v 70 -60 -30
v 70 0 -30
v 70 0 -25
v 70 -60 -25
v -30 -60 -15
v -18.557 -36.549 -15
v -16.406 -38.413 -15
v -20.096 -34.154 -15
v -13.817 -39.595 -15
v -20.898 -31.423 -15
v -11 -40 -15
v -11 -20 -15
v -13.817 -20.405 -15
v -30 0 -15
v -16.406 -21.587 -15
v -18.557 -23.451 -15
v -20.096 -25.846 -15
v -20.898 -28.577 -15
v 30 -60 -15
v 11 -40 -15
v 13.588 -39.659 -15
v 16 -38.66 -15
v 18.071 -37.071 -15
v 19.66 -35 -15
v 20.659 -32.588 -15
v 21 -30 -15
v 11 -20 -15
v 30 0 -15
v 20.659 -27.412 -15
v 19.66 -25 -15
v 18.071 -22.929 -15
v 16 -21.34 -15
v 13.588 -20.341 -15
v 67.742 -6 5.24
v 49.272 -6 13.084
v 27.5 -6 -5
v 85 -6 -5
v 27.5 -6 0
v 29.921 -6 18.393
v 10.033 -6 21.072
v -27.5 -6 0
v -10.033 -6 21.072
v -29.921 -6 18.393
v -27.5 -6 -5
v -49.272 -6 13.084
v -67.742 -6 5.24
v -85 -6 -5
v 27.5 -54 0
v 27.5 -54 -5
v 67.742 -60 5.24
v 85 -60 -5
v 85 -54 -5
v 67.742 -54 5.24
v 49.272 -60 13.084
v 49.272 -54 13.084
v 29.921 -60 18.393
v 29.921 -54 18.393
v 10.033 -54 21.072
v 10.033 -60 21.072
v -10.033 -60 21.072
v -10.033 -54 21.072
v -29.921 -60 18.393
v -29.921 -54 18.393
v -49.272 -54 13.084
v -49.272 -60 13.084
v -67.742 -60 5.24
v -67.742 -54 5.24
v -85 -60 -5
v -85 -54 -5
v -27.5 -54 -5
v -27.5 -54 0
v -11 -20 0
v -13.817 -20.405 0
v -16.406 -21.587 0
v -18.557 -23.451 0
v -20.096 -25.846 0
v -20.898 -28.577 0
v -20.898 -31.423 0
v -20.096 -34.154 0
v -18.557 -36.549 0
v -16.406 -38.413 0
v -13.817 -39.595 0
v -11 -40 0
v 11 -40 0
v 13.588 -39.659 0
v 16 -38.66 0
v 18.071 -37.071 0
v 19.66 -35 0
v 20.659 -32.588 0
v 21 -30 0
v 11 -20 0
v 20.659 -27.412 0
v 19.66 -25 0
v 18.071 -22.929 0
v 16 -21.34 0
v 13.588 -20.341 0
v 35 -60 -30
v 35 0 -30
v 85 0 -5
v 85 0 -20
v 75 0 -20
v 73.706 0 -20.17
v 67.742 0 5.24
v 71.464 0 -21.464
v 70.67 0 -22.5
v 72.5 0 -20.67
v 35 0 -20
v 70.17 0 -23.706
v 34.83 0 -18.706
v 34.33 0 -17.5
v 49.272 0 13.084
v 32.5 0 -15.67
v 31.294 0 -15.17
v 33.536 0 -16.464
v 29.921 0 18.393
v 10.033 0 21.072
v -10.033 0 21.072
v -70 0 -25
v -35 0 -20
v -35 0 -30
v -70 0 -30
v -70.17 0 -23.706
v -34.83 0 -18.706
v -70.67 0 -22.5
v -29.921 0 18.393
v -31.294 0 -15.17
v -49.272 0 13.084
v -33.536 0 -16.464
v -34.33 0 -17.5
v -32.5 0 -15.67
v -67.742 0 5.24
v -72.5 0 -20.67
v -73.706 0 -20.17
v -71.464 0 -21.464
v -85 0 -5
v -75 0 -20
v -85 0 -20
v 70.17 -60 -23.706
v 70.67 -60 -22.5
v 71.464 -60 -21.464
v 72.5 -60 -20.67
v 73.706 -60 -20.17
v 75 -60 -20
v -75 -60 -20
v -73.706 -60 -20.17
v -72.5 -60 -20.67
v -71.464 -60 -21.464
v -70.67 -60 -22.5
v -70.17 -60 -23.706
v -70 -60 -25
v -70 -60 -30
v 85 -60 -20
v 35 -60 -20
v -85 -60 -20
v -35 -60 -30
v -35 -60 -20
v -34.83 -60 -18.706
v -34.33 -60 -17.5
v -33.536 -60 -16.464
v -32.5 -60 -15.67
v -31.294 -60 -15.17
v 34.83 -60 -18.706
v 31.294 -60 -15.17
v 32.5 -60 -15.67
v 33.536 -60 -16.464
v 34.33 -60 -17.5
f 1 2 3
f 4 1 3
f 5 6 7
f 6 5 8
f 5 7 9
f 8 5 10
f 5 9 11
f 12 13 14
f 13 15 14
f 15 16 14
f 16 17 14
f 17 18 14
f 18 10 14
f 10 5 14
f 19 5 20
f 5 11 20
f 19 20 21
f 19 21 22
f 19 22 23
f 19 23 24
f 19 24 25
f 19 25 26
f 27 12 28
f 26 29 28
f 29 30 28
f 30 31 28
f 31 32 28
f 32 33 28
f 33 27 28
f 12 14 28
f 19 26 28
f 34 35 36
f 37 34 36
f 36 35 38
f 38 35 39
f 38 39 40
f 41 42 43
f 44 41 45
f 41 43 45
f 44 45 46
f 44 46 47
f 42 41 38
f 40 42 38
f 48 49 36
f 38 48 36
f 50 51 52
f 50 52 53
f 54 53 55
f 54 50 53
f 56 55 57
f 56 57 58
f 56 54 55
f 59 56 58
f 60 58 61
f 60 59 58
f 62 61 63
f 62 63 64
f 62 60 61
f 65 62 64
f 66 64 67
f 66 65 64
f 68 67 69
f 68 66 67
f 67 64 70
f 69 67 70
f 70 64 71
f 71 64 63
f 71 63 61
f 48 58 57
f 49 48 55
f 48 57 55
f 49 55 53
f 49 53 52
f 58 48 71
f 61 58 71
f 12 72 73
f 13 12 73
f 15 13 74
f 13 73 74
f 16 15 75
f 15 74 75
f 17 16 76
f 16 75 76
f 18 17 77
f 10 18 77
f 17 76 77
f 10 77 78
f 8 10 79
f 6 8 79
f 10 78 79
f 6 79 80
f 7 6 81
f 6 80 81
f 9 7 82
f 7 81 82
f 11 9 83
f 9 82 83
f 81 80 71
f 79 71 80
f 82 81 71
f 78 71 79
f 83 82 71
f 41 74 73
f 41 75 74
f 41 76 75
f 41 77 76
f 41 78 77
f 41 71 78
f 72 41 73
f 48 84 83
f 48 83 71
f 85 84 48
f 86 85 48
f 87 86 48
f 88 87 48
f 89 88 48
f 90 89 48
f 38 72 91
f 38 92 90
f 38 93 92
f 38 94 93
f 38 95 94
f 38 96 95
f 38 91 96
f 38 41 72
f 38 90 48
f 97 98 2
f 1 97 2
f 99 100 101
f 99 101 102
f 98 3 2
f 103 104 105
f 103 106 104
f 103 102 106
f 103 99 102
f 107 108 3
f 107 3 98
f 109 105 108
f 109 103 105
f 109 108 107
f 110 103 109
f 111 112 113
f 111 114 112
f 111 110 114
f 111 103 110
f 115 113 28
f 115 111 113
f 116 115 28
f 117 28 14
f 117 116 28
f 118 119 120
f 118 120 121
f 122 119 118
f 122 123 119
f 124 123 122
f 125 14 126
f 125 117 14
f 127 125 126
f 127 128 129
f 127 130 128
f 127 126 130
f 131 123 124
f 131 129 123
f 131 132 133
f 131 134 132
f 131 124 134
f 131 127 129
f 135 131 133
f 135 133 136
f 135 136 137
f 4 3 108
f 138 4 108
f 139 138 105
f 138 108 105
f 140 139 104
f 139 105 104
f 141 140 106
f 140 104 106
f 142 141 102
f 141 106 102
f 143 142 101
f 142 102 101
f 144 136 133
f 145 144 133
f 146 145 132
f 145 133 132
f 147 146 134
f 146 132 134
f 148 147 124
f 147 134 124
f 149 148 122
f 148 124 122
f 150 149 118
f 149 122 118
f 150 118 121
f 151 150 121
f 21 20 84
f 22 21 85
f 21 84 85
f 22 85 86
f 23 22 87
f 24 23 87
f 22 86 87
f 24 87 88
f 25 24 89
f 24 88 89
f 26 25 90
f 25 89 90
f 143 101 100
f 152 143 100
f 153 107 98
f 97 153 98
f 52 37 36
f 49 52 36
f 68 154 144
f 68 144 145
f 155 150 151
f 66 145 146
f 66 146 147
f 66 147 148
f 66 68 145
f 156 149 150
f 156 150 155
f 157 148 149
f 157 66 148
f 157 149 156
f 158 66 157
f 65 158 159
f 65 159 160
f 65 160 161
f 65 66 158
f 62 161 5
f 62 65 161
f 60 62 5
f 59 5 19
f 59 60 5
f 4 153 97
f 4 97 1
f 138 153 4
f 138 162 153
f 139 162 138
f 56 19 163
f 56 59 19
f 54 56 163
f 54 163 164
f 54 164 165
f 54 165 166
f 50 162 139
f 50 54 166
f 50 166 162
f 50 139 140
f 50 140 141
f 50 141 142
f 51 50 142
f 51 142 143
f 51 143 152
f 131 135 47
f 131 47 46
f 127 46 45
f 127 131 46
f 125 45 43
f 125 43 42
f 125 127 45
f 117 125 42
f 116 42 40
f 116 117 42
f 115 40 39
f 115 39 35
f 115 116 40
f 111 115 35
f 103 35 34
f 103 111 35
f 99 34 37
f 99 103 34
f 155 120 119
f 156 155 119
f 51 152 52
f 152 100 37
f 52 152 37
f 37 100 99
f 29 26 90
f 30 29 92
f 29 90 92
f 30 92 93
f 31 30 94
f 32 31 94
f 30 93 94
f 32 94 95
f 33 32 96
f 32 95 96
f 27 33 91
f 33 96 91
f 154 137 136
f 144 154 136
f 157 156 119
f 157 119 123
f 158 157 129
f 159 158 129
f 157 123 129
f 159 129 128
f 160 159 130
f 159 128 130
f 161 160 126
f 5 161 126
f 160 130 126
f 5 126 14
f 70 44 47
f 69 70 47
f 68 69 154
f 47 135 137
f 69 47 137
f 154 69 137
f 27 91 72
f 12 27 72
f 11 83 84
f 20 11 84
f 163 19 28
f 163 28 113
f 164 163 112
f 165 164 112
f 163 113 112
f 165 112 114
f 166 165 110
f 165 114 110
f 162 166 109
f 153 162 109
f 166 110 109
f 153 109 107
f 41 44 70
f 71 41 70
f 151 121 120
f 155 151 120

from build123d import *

# Parameters (mm, degrees)
F1_DEPTH = 60
F3_DEPTH = 6
F5_DEPTH = 6
F7_DEPTH = 5
F9_DEPTH = 30.001


with BuildPart() as f1:
    # F0 (on Front) → F1 (new body)
    with BuildSketch(Plane.XZ):
        with BuildLine():
            Line((35, -30), (70, -30))
            Line((70, -30), (70, -25))
            ThreePointArc((70, -25), (71.4644660941, -21.4644660941), (75, -20))
            Line((75, -20), (85, -20))
            Line((85, -20), (85, -5))
            Line((85, -5), (-85, -5))
            Line((-85, -5), (-85, -20))
            Line((-85, -20), (-75, -20))
            ThreePointArc((-75, -20), (-71.4644660941, -21.4644660941), (-70, -25))
            Line((-70, -25), (-70, -30))
            Line((-70, -30), (-35, -30))
            Line((-35, -30), (-35, -20))
            ThreePointArc((-35, -20), (-33.5355339059, -16.4644660941), (-30, -15))
            Line((-30, -15), (30, -15))
            ThreePointArc((30, -15), (33.5355339059, -16.4644660941), (35, -20))
            Line((35, -20), (35, -30))
        make_face()
    extrude(amount=F1_DEPTH)

    # F2 (on face) → F3 (join)
    with BuildSketch(Plane(origin=(0, 0, 0), x_dir=(-1, 0, 0), z_dir=(0, 1, 0))):
        with BuildLine():
            Line((-85, -5), (85, -5))
            ThreePointArc((85, -5), (0, 21.4079290569), (-85, -5))
        make_face()
    extrude(amount=-F3_DEPTH)

    # F4 (on face) → F5 (join)
    with BuildSketch(Plane.XZ.offset(60)):
        with BuildLine():
            Line((-85, -5), (85, -5))
            ThreePointArc((85, -5), (0, 21.4079290569), (-85, -5))
        make_face()
    extrude(amount=-F5_DEPTH)

    # F6 (on face) → F7 (join)
    with BuildSketch(Plane.XY.offset(-5)):
        Polygon((27.5, -54), (27.5, -6), (0, -6), (-27.5, -6), (-27.5, -54), align=None)
    extrude(amount=F7_DEPTH)

    # F8 (on face) → F9 (cut, through all)
    with BuildSketch(Plane.XY):
        with BuildLine():
            Line((11, -20), (0, -20))
            Line((0, -20), (0, -30))
            Line((0, -30), (1, -30))
            ThreePointArc((1, -30), (3.9289321881, -22.9289321881), (11, -20))
        make_face()
        with BuildLine():
            Line((0, -30), (0, -20))
            Line((0, -20), (-11, -20))
            ThreePointArc((-11, -20), (-3.9289321881, -22.9289321881), (-1, -30))
            Line((-1, -30), (0, -30))
        make_face()
        with BuildLine():
            Line((1, -30), (0, -30))
            Line((0, -30), (0, -40))
            Line((0, -40), (11, -40))
            ThreePointArc((11, -40), (3.9289321881, -37.0710678119), (1, -30))
        make_face()
        with BuildLine():
            Line((0, -40), (0, -30))
            Line((0, -30), (-1, -30))
            ThreePointArc((-1, -30), (-3.9289321881, -37.0710678119), (-11, -40))
            Line((-11, -40), (0, -40))
        make_face()
        with BuildLine():
            Line((-11, -30), (-11, -20))
            ThreePointArc((-11, -20), (-21, -30), (-11, -40))
            Line((-11, -40), (-11, -30))
        make_face()
        with BuildLine():
            ThreePointArc((-1, -30), (-3.9289321881, -22.9289321881), (-11, -20))
            Line((-11, -20), (-11, -30))
            Line((-11, -30), (-1, -30))
        make_face()
        with BuildLine():
            Line((11, -30), (11, -20))
            ThreePointArc((11, -20), (3.9289321881, -22.9289321881), (1, -30))
            Line((1, -30), (11, -30))
        make_face()
        with BuildLine():
            ThreePointArc((21, -30), (18.0710678119, -22.9289321881), (11, -20))
            Line((11, -20), (11, -30))
            Line((11, -30), (11, -40))
            ThreePointArc((11, -40), (18.0710678119, -37.0710678119), (21, -30))
        make_face()
        with BuildLine():
            Line((11, -30), (1, -30))
            ThreePointArc((1, -30), (3.9289321881, -37.0710678119), (11, -40))
            Line((11, -40), (11, -30))
        make_face()
        with BuildLine():
            ThreePointArc((-11, -40), (-3.9289321881, -37.0710678119), (-1, -30))
            Line((-1, -30), (-11, -30))
            Line((-11, -30), (-11, -40))
        make_face()
    extrude(amount=-F9_DEPTH, mode=Mode.SUBTRACT)


solid = f1.part
